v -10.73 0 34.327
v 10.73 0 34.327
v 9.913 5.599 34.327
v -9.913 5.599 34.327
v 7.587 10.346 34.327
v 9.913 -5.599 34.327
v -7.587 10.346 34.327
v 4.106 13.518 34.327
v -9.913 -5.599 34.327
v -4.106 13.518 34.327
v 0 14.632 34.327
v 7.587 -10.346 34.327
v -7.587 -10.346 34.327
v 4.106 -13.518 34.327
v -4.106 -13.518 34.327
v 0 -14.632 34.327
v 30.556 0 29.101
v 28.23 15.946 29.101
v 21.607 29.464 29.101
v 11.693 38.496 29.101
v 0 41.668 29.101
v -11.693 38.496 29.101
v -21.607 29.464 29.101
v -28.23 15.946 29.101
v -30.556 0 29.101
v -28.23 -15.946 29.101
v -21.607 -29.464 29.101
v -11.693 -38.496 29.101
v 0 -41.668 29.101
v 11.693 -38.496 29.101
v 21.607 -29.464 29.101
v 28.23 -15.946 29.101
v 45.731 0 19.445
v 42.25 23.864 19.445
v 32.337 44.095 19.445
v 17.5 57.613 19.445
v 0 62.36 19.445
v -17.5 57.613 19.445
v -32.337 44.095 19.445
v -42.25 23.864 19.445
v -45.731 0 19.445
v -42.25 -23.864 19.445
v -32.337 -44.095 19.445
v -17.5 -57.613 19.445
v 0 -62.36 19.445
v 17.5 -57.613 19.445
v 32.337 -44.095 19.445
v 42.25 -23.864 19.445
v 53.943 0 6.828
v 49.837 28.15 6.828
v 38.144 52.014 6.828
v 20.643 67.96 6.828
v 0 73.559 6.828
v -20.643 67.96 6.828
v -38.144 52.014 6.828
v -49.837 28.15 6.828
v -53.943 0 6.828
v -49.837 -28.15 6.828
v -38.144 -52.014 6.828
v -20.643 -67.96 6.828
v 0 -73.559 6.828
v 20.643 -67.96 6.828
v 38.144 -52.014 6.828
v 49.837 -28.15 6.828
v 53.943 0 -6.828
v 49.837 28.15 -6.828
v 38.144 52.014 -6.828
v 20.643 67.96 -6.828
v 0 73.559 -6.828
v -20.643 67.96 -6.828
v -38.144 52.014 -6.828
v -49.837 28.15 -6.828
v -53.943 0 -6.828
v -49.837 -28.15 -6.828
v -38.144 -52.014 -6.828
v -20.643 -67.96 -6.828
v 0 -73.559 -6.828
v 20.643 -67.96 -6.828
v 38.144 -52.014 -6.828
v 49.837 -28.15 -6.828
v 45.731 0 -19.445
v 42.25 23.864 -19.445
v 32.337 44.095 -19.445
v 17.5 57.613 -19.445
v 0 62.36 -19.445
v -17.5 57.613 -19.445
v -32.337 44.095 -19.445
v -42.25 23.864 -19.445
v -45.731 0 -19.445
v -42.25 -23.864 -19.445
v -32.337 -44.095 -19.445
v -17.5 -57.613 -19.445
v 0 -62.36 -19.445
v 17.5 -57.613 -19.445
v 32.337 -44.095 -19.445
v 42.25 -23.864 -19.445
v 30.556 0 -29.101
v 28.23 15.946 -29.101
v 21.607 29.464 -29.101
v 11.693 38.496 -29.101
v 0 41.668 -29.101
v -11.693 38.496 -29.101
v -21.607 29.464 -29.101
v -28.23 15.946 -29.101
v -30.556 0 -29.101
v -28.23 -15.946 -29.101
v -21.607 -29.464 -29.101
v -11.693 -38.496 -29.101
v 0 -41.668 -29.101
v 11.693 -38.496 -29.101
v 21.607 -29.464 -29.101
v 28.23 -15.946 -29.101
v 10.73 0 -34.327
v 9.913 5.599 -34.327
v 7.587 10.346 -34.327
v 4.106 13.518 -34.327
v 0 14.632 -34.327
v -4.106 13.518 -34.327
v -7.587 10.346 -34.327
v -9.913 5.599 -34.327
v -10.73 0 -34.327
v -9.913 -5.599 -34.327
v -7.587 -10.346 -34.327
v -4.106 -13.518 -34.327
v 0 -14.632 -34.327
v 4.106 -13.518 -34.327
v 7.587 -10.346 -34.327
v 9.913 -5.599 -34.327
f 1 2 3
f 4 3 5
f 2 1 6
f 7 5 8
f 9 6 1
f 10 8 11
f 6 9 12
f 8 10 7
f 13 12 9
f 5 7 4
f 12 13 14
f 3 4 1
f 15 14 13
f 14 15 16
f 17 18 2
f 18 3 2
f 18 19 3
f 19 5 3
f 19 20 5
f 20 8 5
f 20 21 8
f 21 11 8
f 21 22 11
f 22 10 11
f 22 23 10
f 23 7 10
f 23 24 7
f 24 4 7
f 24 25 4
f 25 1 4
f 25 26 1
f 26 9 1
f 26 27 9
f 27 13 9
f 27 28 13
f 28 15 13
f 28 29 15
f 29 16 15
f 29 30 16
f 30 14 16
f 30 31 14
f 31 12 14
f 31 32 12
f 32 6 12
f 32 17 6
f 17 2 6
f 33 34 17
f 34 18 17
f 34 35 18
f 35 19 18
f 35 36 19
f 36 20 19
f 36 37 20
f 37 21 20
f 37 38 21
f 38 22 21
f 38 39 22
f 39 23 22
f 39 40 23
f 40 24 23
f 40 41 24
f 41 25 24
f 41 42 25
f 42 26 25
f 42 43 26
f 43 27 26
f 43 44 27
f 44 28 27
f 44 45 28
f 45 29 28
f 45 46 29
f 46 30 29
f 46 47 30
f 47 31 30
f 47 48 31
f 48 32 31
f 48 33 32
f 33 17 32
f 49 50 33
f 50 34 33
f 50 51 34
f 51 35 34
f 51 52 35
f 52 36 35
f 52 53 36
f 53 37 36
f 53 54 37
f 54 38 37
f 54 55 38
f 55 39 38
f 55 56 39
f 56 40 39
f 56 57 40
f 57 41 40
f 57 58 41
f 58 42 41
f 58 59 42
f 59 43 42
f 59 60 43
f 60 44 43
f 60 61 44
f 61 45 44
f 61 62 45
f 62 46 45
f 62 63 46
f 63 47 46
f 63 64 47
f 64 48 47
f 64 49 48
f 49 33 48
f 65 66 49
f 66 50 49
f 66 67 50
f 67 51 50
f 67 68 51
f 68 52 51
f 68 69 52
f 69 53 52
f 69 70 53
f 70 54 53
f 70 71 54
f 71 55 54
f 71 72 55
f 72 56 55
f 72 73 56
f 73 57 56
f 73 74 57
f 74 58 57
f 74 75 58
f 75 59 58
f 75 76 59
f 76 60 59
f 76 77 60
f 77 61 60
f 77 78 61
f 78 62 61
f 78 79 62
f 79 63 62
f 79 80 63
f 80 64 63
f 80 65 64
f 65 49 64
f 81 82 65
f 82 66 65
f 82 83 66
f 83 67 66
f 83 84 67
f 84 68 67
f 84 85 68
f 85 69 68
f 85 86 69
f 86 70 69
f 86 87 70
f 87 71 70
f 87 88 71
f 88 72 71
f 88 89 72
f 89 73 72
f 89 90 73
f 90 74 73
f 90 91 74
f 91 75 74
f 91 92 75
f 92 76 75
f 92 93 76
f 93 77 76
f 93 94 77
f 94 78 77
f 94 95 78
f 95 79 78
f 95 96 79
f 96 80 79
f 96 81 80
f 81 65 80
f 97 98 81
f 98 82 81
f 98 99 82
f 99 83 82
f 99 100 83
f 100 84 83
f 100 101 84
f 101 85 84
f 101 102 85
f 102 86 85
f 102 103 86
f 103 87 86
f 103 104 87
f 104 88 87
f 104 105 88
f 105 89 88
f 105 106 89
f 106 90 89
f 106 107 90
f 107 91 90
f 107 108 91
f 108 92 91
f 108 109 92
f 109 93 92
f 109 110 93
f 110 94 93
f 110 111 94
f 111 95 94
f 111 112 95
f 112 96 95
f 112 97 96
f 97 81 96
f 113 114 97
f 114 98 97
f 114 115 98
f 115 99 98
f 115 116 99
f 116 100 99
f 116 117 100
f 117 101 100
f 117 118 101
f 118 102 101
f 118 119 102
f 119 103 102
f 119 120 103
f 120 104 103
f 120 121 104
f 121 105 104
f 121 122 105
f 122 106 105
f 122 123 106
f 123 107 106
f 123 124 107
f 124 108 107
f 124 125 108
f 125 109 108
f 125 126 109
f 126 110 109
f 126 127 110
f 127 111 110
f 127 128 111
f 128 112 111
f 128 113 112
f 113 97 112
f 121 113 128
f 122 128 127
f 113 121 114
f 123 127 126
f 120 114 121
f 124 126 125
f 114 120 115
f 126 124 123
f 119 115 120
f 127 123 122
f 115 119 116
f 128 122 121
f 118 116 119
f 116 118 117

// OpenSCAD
// Generated by SolidPython 1.0.1 on 2020-07-29 00:46:50


scale(v = [11, 15, 7]) {
	sphere(r = 5);
}
/***********************************************
*********      SolidPython code:      **********
************************************************
 
# import packages: SolidPython
from solid import *
from solid.utils import *
from itertools import chain, combinations, permutations


class Resize:

    def __init__(self, scad_file):
        self.scad_file = scad_file
        #self.scad_file = import_scad(scad_file)
        # cone/cylinder param:
        self.r1 = 0
        self.r2 = 0
        self.h = 0
        # rectangular prism param:
        self.w = 0
        self.l = 0
        # ellipse param:
        self.r = 0

    # import OpenScad code (file name corresponds to shape)


    # classify shape + parameters
    def assign(self, param1, param2, param3):
        if self.scad_file == 'cone.scad':
            self.r1 = param1
            self.r2 = param2
            self.h = param3
        elif self.scad_file == 'cylinder.scad':
            self.r1 = param1
            self.r2 = param2
            self.h = param3
        elif self.scad_file == 'rectangularPrism.scad':
            self.h = param1
            self.l = param2
            self.w = param3
        else:
            self.r = param1
            self.h = param2

    # resize parameters
    def iterate(self):
        x = range(3, 20, 2)
        i = 1
        if self.scad_file == 'cone.scad':
            tempList = list(permutations(x, 2))
            for temp in tempList:
                param1 = temp[0]
                param2 = temp[1]
                filepath = 'produced_scad_files/' + 'cone' + str(param1) + '_' + str(param2) + '_' + '.scad'
                scad_render_to_file(cylinder(h=param1, r1=param2, r2=0), filepath)

        elif self.scad_file == 'cylinder.scad':
            tempList = list(permutations(x, 3))
            for temp in tempList:
                param1 = temp[0]
                param2 = temp[1]
                filepath = 'produced_scad_files/' + 'cylinder' + str(param1) + '_' + str(param2) + '_' + '.scad'
                scad_render_to_file(cylinder(h=param1, r1=param2, r2=param2), filepath)

        elif self.scad_file == 'rectangularPrism.scad':
            tempList = list(permutations(x, 3))
            for temp in tempList:
                param1 = temp[0]
                param2 = temp[1]
                param3 = temp[2]
                filepath = 'produced_scad_files/' + 'rectangularPrism' + str(param1) + '_' + str(param2) + '_' + str(
                    param3) + '.scad'
                scad_render_to_file(cube(size=(param1, param2, param3)), filepath)

        elif self.scad_file == 'ellipse.scad':
            tempList = list(permutations(x, 4))
            for temp in tempList:
                param1 = temp[0]
                param2 = temp[1]
                param3 = temp[2]
                param4 = temp[3]
                filepath = 'produced_scad_files/' + 'ellipse' + str(param1) + '_' + str(param2) + '_' + str(param3) + '_' + str(param4) + '.scad'
                scad_render_to_file(scale([param1, param2, param3])(sphere(r=param4)), filepath)

    def render_to_scadfile(self):
        scad_render_to_file(scad, 'example.scad') 
 
************************************************/
